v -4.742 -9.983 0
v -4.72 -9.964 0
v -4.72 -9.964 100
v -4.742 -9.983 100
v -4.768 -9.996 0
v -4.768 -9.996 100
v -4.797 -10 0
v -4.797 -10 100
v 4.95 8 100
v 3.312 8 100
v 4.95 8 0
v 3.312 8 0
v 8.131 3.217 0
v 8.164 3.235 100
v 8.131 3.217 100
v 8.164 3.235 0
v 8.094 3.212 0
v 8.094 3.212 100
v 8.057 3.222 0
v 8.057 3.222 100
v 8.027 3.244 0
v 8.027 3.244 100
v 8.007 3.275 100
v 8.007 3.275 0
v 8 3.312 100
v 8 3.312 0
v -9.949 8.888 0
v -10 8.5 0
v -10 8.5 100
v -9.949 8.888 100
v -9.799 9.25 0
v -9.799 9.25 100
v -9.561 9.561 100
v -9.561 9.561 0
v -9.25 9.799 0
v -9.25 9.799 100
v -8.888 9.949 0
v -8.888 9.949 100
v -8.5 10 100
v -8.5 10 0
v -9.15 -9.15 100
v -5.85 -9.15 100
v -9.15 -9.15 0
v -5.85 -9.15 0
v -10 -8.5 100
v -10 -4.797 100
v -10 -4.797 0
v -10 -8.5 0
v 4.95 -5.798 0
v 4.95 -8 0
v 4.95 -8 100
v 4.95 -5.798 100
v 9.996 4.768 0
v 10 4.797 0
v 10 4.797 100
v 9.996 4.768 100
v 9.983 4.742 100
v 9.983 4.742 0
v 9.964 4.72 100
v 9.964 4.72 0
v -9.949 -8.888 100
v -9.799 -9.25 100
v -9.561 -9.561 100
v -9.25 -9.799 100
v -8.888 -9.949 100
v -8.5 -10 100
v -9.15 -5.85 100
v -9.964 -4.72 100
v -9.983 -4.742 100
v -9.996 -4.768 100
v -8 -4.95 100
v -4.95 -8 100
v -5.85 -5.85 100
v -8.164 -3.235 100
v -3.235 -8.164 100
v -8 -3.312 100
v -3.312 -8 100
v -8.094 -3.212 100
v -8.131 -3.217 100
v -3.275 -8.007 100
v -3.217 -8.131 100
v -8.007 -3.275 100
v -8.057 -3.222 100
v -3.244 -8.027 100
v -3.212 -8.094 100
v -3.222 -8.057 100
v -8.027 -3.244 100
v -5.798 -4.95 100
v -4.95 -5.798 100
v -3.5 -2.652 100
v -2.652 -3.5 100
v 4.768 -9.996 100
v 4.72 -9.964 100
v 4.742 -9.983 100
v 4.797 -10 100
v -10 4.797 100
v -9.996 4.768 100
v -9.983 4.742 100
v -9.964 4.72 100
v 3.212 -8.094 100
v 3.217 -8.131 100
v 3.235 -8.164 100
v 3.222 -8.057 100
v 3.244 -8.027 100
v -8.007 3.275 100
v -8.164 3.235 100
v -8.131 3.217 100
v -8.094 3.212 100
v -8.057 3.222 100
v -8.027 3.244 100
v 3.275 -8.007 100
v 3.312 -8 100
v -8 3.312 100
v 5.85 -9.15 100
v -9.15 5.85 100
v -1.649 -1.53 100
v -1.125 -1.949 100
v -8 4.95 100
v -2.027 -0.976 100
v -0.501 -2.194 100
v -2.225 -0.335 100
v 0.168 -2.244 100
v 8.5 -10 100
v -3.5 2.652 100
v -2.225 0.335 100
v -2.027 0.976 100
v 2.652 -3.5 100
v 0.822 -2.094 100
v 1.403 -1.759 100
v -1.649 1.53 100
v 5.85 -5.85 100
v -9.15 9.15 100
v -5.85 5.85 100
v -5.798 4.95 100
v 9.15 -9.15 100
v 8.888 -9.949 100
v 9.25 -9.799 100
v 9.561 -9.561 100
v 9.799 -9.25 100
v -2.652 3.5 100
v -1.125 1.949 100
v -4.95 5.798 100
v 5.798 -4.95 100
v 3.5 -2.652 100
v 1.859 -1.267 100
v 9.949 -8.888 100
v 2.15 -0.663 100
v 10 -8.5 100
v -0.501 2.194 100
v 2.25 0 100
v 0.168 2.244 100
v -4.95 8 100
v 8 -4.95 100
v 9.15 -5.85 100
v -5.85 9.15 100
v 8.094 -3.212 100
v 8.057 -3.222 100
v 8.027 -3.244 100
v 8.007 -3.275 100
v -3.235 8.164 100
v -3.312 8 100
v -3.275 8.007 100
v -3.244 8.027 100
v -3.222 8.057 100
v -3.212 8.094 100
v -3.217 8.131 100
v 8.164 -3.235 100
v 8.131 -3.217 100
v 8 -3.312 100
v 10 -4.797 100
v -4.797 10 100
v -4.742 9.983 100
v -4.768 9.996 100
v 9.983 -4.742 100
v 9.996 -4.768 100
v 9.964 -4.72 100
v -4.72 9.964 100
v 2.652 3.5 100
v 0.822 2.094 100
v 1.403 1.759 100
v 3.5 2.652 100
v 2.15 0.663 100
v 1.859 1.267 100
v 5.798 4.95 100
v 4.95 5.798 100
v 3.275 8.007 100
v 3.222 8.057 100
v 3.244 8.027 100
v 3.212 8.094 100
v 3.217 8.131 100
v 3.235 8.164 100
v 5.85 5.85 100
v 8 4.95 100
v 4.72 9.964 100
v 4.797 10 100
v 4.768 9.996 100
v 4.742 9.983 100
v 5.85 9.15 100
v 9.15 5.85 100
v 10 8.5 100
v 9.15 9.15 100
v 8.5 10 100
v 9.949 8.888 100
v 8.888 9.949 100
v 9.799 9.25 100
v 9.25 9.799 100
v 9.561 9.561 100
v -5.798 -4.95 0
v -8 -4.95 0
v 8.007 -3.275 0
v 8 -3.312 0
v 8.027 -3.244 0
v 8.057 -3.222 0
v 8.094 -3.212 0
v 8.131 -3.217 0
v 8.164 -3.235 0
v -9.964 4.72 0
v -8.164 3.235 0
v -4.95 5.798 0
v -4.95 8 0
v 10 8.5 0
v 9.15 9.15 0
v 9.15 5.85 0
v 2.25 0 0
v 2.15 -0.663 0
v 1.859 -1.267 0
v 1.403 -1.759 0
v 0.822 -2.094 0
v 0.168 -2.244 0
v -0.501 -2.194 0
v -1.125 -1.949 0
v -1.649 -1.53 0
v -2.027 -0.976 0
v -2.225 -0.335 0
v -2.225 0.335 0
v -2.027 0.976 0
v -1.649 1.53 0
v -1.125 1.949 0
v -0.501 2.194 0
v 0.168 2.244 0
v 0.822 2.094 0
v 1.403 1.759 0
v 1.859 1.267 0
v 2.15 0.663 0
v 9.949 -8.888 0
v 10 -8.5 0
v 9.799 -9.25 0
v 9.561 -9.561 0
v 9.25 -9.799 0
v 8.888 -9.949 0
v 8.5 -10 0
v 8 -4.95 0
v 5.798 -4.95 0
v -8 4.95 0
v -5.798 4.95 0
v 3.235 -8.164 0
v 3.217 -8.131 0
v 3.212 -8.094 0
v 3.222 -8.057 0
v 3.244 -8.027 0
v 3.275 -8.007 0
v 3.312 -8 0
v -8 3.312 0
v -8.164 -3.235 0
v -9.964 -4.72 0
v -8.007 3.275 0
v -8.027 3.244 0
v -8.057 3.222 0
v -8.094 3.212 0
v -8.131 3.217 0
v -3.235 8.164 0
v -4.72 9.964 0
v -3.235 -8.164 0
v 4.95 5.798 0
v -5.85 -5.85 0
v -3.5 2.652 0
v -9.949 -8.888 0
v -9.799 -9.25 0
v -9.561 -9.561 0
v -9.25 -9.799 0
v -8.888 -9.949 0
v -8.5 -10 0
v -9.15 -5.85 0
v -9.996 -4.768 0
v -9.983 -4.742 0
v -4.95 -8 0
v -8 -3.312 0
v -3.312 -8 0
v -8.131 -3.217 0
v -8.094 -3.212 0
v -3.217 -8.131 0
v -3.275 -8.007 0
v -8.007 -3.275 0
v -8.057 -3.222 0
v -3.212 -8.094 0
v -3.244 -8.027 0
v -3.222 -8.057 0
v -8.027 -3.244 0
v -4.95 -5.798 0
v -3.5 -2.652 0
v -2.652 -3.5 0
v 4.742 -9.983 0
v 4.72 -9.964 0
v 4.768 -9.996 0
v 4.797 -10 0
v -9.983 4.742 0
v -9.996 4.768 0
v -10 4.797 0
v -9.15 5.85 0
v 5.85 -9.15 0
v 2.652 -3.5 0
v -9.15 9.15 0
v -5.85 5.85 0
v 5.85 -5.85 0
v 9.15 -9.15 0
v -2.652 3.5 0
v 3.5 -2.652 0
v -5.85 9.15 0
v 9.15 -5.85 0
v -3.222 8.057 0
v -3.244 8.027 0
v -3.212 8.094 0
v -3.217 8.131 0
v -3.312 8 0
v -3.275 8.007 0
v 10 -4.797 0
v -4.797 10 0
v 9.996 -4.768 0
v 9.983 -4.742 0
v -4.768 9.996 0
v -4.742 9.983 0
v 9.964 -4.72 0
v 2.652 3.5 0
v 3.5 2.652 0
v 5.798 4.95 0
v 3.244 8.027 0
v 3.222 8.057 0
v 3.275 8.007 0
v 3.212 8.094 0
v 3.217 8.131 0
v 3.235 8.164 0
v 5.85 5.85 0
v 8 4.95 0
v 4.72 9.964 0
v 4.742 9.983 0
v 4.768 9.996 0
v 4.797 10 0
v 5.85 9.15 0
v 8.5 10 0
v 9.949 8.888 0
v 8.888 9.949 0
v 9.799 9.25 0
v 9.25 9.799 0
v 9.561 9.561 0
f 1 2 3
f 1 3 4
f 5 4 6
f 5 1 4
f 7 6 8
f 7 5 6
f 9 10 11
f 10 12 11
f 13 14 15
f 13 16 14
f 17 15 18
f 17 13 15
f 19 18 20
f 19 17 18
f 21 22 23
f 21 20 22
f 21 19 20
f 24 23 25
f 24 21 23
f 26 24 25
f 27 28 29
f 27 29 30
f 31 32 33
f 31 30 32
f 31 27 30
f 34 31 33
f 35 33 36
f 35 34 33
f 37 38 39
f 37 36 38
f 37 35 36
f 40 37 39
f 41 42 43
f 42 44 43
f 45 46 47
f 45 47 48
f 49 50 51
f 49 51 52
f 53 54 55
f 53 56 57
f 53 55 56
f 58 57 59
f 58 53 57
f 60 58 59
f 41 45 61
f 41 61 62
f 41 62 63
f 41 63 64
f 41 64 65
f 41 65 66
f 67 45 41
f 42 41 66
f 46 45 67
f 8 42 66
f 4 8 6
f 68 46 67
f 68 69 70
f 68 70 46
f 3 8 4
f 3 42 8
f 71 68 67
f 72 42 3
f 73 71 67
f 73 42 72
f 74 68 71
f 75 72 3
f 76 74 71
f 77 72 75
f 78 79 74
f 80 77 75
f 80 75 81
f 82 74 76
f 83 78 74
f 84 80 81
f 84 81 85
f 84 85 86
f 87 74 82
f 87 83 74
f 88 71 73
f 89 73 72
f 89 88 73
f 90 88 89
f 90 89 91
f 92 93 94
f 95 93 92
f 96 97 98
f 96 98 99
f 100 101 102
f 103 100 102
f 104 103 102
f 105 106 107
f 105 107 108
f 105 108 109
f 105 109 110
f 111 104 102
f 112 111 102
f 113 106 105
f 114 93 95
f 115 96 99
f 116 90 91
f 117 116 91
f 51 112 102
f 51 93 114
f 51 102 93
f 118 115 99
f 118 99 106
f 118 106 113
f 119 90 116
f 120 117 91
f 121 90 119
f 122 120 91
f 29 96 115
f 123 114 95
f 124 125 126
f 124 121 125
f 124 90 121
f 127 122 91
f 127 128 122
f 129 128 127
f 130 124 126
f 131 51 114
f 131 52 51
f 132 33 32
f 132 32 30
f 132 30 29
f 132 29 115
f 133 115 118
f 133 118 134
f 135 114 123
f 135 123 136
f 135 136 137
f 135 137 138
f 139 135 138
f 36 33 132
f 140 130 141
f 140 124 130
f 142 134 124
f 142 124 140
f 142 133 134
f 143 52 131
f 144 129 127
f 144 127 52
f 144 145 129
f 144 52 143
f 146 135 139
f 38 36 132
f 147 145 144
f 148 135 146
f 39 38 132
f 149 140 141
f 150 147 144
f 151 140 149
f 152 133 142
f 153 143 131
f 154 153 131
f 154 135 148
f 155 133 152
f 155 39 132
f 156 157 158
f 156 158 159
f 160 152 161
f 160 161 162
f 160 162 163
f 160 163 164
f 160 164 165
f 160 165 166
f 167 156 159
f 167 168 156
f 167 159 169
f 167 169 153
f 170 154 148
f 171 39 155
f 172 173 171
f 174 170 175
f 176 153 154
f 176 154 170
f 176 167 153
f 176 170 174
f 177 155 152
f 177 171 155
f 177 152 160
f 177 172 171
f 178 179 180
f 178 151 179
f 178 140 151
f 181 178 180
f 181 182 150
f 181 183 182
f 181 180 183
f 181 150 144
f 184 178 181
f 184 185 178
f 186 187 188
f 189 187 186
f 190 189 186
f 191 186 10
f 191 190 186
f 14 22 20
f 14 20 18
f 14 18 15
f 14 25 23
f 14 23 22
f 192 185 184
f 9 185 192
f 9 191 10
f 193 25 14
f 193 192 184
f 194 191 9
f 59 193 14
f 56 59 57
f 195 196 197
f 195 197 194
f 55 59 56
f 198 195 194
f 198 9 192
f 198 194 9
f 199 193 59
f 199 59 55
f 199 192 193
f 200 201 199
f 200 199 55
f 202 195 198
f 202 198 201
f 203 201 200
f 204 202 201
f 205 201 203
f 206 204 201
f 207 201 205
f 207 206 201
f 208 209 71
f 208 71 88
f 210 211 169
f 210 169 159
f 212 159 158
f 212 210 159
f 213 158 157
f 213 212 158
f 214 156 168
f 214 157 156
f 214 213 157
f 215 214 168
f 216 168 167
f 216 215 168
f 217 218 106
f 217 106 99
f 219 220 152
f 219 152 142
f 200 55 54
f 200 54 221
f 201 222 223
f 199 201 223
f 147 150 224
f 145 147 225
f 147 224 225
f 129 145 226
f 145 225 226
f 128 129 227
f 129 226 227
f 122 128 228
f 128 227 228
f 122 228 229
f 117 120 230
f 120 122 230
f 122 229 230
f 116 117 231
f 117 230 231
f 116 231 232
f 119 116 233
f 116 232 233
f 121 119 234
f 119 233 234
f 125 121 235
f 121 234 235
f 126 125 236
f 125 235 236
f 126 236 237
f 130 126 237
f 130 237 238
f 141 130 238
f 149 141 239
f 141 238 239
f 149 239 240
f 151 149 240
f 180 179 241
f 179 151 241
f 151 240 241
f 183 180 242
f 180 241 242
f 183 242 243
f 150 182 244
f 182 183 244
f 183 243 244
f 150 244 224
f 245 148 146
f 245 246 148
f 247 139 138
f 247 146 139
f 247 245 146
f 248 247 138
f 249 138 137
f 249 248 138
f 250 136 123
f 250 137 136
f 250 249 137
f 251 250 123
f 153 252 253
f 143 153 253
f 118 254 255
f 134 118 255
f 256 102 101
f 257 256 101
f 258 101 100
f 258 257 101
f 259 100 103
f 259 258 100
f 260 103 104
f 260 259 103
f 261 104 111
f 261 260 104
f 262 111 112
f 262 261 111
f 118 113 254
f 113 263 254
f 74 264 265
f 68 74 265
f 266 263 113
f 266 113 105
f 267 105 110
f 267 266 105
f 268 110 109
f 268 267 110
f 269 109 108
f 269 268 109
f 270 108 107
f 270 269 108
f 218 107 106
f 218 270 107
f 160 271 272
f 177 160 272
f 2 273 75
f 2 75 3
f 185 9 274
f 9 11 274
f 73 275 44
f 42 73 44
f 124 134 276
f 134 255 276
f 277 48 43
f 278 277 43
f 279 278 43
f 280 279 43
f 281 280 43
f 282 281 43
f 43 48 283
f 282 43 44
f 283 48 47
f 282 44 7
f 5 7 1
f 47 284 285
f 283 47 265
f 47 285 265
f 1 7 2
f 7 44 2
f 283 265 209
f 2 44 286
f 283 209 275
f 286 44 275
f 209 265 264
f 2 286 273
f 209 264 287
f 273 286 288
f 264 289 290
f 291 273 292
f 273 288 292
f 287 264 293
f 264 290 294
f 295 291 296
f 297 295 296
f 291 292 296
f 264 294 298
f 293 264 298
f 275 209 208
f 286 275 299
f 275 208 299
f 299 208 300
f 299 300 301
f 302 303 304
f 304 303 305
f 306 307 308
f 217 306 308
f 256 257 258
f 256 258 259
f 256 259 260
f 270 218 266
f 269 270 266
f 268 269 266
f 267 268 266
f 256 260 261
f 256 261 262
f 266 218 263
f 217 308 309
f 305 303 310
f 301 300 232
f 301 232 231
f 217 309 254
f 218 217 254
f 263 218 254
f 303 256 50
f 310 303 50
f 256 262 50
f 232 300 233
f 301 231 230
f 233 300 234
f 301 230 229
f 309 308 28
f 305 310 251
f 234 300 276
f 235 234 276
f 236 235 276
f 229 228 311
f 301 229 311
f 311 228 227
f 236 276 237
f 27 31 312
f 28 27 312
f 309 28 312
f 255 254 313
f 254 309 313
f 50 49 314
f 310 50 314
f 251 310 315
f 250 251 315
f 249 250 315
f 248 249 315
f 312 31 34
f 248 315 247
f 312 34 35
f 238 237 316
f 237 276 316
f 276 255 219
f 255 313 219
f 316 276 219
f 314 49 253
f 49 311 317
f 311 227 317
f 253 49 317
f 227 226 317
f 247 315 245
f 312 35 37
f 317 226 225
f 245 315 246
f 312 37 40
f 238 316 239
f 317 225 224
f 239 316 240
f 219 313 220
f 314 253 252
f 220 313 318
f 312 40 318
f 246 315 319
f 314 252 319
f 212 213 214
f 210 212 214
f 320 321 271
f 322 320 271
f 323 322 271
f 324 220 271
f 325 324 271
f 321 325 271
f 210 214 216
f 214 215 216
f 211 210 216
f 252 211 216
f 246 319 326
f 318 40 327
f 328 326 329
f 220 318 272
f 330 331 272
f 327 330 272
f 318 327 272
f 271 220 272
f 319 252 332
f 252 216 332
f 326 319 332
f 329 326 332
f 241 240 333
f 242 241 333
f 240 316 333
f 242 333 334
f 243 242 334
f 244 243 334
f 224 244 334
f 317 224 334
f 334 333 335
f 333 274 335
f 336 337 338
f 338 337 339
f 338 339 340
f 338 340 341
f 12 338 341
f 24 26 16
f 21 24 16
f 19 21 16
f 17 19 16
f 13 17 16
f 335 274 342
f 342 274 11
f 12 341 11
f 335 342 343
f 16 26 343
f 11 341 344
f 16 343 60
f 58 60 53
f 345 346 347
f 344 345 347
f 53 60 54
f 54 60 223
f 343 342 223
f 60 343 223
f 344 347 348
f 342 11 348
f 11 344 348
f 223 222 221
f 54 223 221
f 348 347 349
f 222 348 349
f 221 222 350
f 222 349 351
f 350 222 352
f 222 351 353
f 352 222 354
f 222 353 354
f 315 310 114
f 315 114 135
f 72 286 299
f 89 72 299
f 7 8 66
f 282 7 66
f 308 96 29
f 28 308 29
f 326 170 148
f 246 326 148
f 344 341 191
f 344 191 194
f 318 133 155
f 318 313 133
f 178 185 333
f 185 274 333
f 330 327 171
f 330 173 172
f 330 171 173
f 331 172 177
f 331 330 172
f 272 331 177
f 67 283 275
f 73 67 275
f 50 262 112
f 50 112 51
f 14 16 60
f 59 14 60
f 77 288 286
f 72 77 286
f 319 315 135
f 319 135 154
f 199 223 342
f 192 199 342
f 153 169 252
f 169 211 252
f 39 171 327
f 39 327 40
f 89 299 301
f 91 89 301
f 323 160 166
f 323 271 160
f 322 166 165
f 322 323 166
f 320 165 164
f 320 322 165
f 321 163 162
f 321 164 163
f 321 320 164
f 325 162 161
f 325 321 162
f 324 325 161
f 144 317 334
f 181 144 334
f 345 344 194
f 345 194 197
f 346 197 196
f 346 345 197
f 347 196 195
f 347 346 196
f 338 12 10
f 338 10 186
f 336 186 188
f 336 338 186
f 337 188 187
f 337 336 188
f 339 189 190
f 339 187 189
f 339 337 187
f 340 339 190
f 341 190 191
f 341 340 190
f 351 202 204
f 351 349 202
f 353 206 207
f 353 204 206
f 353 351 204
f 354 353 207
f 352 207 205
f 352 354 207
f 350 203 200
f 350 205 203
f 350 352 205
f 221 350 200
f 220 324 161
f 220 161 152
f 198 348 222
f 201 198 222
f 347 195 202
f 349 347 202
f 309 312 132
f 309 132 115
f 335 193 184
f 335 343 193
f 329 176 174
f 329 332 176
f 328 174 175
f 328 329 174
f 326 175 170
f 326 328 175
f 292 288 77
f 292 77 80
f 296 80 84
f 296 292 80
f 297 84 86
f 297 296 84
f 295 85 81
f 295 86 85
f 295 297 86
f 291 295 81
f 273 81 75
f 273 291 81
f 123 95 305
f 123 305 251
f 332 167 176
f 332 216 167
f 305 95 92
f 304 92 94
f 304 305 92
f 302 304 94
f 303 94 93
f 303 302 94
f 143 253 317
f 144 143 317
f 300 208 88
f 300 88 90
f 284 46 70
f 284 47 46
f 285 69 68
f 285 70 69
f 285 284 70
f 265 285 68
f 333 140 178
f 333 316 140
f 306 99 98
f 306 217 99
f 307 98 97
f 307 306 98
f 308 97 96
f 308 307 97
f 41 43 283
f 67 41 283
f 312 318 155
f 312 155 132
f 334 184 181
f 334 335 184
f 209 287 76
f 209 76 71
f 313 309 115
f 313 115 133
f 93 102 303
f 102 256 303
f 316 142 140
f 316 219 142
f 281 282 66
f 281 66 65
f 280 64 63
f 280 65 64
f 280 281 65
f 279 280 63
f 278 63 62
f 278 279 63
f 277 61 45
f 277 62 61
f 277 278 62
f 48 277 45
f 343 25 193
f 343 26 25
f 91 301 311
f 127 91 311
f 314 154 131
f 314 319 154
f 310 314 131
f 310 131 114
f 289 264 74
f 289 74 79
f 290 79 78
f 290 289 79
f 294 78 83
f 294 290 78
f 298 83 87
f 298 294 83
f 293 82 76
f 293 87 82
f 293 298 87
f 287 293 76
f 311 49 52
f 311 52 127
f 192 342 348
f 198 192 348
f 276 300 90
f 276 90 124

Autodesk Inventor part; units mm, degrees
ref_plane "YZ Plane" through (0, 0, 0) normal (1, 0, 0) x (0, 1, 0)
ref_plane "Начальная плоскость" through (0, 0, 0) normal (0, 0, 1) x (1, 0, 0)
ref_plane "Конечная плоскость" through (0, 0, 100) normal (0, 0, 1) x (1, 0, 0)
sketch "Эскиз1" plane through (0, 0, 0) normal (0, 0, 1) x (1, 0, 0)
  line L0 (-14.4349, 0) -> (14.4349, 0) projected
  line L1 (0, -14) -> (0, 14) projected
  line L2 (0, 0) -> (7.5, 7.5) construction
  circle A0 centre (7.5, 7.5) radius 1.65 construction
  line L3 (5.85, 9.15) -> (9.15, 9.15)
  line L4 (9.15, 9.15) -> (9.15, 5.85)
  line L5 (9.15, 5.85) -> (5.85, 5.85)
  line L6 (5.85, 5.85) -> (5.85, 9.15)
  line L7 (3.235, 8.1636) -> (4.72, 9.9636)
  line L8 (4.7971, 10) -> (8.5, 10)
  line L9 (3.3121, 8) -> (4.95, 8)
  line L10 (4.95, 8) -> (4.95, 5.7985)
  line L11 (4.95, 5.7985) -> (2.6515, 3.5)
  line L12 (0, 3.5) -> (2.6515, 3.5)
  circle A1 centre (0, 0) radius 2.25
  line L13 (8.1636, 3.235) -> (9.9636, 4.72)
  line L14 (10, 4.7971) -> (10, 8.5)
  line L15 (8, 3.3121) -> (8, 4.95)
  line L16 (8, 4.95) -> (5.7985, 4.95)
  line L17 (5.7985, 4.95) -> (3.5, 2.6515)
  line L18 (3.5, 0) -> (3.5, 2.6515)
  arc A2 (10, 8.5) -> (8.5, 10) centre (8.5, 8.5) ccw
  line L19 (0, 0) -> (-7.5, 7.5) construction
  circle A3 centre (-7.5, 7.5) radius 1.65 construction
  line L20 (-5.85, 9.15) -> (-9.15, 9.15)
  line L21 (-9.15, 9.15) -> (-9.15, 5.85)
  line L22 (-9.15, 5.85) -> (-5.85, 5.85)
  line L23 (-5.85, 5.85) -> (-5.85, 9.15)
  line L24 (-3.235, 8.1636) -> (-4.72, 9.9636)
  line L25 (-4.7971, 10) -> (-8.5, 10)
  line L26 (-3.3121, 8) -> (-4.95, 8)
  line L27 (-4.95, 8) -> (-4.95, 5.7985)
  line L28 (-4.95, 5.7985) -> (-2.6515, 3.5)
  line L29 (0, 3.5) -> (-2.6515, 3.5)
  line L30 (-3.5, 0) -> (-3.5, 2.6515)
  line L31 (-5.7985, 4.95) -> (-3.5, 2.6515)
  line L32 (-8, 4.95) -> (-5.7985, 4.95)
  line L33 (-8, 3.3121) -> (-8, 4.95)
  line L34 (-8.1636, 3.235) -> (-9.9636, 4.72)
  line L35 (-10, 4.7971) -> (-10, 8.5)
  arc A4 (-8.5, 10) -> (-10, 8.5) centre (-8.5, 8.5) ccw
  line L36 (0, 14) -> (0, -14)
  line L37 (0, 0) -> (7.5, -7.5) construction
  circle A5 centre (7.5, -7.5) radius 1.65 construction
  line L38 (5.85, -9.15) -> (9.15, -9.15)
  line L39 (9.15, -9.15) -> (9.15, -5.85)
  line L40 (9.15, -5.85) -> (5.85, -5.85)
  line L41 (5.85, -5.85) -> (5.85, -9.15)
  line L42 (3.235, -8.1636) -> (4.72, -9.9636)
  line L43 (4.7971, -10) -> (8.5, -10)
  line L44 (3.3121, -8) -> (4.95, -8)
  line L45 (4.95, -8) -> (4.95, -5.7985)
  line L46 (4.95, -5.7985) -> (2.6515, -3.5)
  line L47 (0, -3.5) -> (2.6515, -3.5)
  line L48 (3.5, 0) -> (3.5, -2.6515)
  line L49 (5.7985, -4.95) -> (3.5, -2.6515)
  line L50 (8, -4.95) -> (5.7985, -4.95)
  line L51 (8, -3.3121) -> (8, -4.95)
  line L52 (8.1636, -3.235) -> (9.9636, -4.72)
  line L53 (10, -4.7971) -> (10, -8.5)
  arc A6 (8.5, -10) -> (10, -8.5) centre (8.5, -8.5) ccw
  line L54 (0, 0) -> (-7.5, -7.5) construction
  line L55 (-4.95, -8) -> (-4.95, -5.7985)
  line L56 (-3.3121, -8) -> (-4.95, -8)
  line L57 (-5.7985, -4.95) -> (-3.5, -2.6515)
  line L58 (-4.95, -5.7985) -> (-2.6515, -3.5)
  line L59 (-3.5, 0) -> (-3.5, -2.6515)
  line L60 (0, -3.5) -> (-2.6515, -3.5)
  circle A7 centre (-7.5, -7.5) radius 1.65 construction
  line L61 (-5.85, -5.85) -> (-5.85, -9.15)
  line L62 (-5.85, -9.15) -> (-9.15, -9.15)
  line L63 (-9.15, -9.15) -> (-9.15, -5.85)
  line L64 (-9.15, -5.85) -> (-5.85, -5.85)
  line L65 (-3.235, -8.1636) -> (-4.72, -9.9636)
  line L66 (-8, -4.95) -> (-5.7985, -4.95)
  line L67 (-8, -3.3121) -> (-8, -4.95)
  line L68 (-8.1636, -3.235) -> (-9.9636, -4.72)
  line L69 (-4.7971, -10) -> (-8.5, -10)
  line L70 (-10, -4.7971) -> (-10, -8.5)
  arc A8 (-10, -8.5) -> (-8.5, -10) centre (-8.5, -8.5) ccw
  arc A9 (3.235, 8.1636) -> (3.3121, 8) centre (3.3121, 8.1) ccw
  arc A10 (4.7971, 10) -> (4.72, 9.9636) centre (4.7971, 9.9) ccw
  arc A11 (8, 3.3121) -> (8.1636, 3.235) centre (8.1, 3.3121) ccw
  arc A12 (9.9636, 4.72) -> (10, 4.7971) centre (9.9, 4.7971) ccw
  arc A13 (-3.3121, 8) -> (-3.235, 8.1636) centre (-3.3121, 8.1) ccw
  arc A14 (-4.72, 9.9636) -> (-4.7971, 10) centre (-4.7971, 9.9) ccw
  arc A15 (-8.1636, 3.235) -> (-8, 3.3121) centre (-8.1, 3.3121) ccw
  arc A16 (-10, 4.7971) -> (-9.9636, 4.72) centre (-9.9, 4.7971) ccw
  arc A17 (-8, -3.3121) -> (-8.1636, -3.235) centre (-8.1, -3.3121) ccw
  arc A18 (-9.9636, -4.72) -> (-10, -4.7971) centre (-9.9, -4.7971) ccw
  arc A19 (-3.235, -8.1636) -> (-3.3121, -8) centre (-3.3121, -8.1) ccw
  arc A20 (-4.7971, -10) -> (-4.72, -9.9636) centre (-4.7971, -9.9) ccw
  arc A21 (4.72, -9.9636) -> (4.7971, -10) centre (4.7971, -9.9) ccw
  arc A22 (3.3121, -8) -> (3.235, -8.1636) centre (3.3121, -8.1) ccw
  arc A23 (8.1636, -3.235) -> (8, -3.3121) centre (8.1, -3.3121) ccw
  arc A24 (10, -4.7971) -> (9.9636, -4.72) centre (9.9, -4.7971) ccw
  point P0 (3.1, 8)
  point P1 (4.75, 10)
  point P2 (7.5, 9.15)
  point P3 (8, 3.1)
  point P4 (10, 4.75)
  point P5 (7.5, 5.85)
  point P6 (9.15, 7.5)
  point P7 (-3.1, 8)
  point P8 (-4.75, 10)
  point P9 (-7.5, 9.15)
  point P10 (-8, 3.1)
  point P11 (-10, 4.75)
  point P12 (-7.5, 5.85)
  point P13 (-9.15, 7.5)
  point P14 (3.1, -8)
  point P15 (4.75, -10)
  point P16 (7.5, -9.15)
  point P17 (8, -3.1)
  point P18 (10, -4.75)
  point P19 (7.5, -5.85)
  point P20 (9.15, -7.5)
  point P21 (-3.1, -8)
  point P22 (-7.5, -5.85)
  point P23 (-7.5, -9.15)
  point P24 (-9.15, -7.5)
  point P25 (-4.75, -10)
  point P26 (-8, -3.1)
  point P27 (-10, -4.75)
  dimension "d0" = 45
  dimension "d1" = 3.3
  dimension "d2" = 1.5
  dimension "d3" = 1.2
  dimension "d4" = 4.5
  dimension "d5" = 6.5
  dimension "d6" = 15
  dimension "d7" = 20
  dimension "d8" = 9.9
  dimension "d9" = 9.5
  dimension "d10" = 6.2
  dimension "d11" = 2
  dimension "d18" = 0.1
  dimension "d19" = 0.1
extrude "Тело" add sketch "Эскиз1" along normal up to surface (100 mm away) from surface at 0 contours A1 L1 L12 L11 L10 L9 A9 L7 A10 L8 A2 L14 A12 L13 A11 L15 L16 L17 L18 L0 | L0 L48 L49 L50 L51 A23 L52 A24 L53 A6 L43 A21 L42 A22 L44 L45 L46 L47 L1 A1 | A1 L0 L30 L31 L32 L33 A15 L34 A16 L35 A4 L25 A14 L24 A13 L26 L27 L28 L29 L1 | L1 L60 L58 L55 L56 A19 L65 A20 L69 A8 L70 A18 L68 A17 L67 L66 L57 L59 L0 A1
sketch "Эскиз2" plane through (0, 0, 0) normal (0, 0, 1) x (1, 0, 0)
  line L0 (0, 0) -> (10, 0)
ref_plane "РабПлоскость3" through (0, 0, 0) normal (0, -1, 0) x (1, 0, 0)
sketch "Эскиз3" plane through (0, 0, 0) normal (0, -1, 0) x (1, 0, 0)
  line L0 (-2, 0) -> (12, 0)
  line L1 (-2, 100) -> (12, 100)
  dimension "d25" = 100
equation "\"G_OFFSET_START\" = 0"
equation "\"G_OFFSET_END\" = 0"
properties part number "короткая палка"
